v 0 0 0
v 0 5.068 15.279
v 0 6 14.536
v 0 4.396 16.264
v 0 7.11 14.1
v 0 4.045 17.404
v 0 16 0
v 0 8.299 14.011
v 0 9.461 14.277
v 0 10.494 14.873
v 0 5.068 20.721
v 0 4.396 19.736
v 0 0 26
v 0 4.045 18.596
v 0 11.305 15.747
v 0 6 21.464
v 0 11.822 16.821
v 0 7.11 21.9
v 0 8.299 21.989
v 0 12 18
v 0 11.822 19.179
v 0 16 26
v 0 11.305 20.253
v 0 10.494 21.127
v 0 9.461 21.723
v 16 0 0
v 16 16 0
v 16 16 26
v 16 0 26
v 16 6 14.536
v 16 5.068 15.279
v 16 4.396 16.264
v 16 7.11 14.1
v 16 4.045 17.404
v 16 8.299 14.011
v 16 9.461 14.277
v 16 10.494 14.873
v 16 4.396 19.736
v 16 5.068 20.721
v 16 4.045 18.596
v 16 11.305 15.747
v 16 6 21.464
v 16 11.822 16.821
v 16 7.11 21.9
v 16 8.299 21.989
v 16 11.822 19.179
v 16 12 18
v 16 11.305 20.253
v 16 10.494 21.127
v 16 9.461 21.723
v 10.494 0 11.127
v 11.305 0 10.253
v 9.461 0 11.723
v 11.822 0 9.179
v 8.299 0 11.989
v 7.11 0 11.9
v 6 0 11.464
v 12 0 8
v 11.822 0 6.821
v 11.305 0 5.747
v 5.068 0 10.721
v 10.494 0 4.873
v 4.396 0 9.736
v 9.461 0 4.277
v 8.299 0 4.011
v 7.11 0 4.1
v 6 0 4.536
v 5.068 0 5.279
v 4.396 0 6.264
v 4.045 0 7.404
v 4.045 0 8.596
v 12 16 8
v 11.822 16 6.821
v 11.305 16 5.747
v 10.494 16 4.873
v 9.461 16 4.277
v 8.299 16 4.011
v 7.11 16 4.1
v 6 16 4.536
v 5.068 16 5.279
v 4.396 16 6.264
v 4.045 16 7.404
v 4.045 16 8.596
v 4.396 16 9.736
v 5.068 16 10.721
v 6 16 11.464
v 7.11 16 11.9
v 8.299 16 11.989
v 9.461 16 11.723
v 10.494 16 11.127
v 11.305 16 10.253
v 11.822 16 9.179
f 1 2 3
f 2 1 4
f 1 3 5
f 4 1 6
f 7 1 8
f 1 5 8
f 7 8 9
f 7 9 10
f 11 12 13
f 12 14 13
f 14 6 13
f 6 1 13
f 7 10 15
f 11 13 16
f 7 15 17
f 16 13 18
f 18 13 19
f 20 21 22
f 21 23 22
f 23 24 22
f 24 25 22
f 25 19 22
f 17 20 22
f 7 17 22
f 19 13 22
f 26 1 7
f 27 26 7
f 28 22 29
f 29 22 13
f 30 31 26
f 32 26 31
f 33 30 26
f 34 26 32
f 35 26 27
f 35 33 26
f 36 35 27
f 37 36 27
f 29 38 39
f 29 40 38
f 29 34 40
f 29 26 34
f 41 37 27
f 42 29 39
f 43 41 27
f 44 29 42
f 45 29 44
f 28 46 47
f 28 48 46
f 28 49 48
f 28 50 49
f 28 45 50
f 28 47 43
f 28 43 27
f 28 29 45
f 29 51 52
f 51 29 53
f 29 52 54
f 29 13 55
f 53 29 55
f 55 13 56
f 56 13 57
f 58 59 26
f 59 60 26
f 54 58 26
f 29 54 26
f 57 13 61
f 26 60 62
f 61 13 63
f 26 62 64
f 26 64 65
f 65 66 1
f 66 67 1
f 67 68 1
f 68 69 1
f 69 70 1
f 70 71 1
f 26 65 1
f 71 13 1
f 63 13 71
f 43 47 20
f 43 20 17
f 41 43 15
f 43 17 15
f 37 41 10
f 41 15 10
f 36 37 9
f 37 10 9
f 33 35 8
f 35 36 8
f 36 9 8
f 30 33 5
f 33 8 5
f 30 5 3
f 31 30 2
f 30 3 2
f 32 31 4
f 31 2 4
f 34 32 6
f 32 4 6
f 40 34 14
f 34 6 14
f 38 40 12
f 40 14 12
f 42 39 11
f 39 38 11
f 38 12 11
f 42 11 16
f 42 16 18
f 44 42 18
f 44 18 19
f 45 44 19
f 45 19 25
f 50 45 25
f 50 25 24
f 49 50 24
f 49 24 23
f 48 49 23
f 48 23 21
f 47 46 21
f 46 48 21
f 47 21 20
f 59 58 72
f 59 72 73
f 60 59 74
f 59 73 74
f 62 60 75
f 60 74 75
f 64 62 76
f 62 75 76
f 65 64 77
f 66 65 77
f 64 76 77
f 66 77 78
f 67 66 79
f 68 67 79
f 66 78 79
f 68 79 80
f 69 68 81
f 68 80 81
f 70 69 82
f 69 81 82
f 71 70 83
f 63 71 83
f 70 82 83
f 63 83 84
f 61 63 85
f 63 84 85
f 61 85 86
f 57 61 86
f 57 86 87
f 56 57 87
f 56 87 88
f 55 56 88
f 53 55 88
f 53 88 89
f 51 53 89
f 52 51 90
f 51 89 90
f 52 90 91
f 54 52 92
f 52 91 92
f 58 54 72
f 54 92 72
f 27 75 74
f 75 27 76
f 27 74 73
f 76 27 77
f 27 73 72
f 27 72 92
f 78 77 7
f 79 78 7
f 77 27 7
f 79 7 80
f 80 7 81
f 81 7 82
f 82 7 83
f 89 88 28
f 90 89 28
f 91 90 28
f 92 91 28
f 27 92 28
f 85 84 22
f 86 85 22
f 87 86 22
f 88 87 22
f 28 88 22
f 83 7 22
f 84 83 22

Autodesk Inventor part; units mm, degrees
ref_plane "YZ Plane" through (0, 0, 0) normal (1, 0, 0) x (0, 1, 0)
ref_plane "XZ Plane" through (0, 0, 0) normal (0, 1, 0) x (-1, 0, 0)
ref_plane "XY Plane" through (0, 0, 0) normal (0, 0, 1) x (1, 0, 0)
sketch "Sketch1" plane through (0, 0, 0) normal (1, 0, 0) x (0, 1, 0)
  line L0 (0, 0) -> (16, 0)
  line L1 (16, 0) -> (16, 26)
  line L2 (16, 26) -> (0, 26)
  line L3 (0, 26) -> (0, 0)
  circle A0 centre (8, 18) radius 4
  dimension "d0" = 16
  dimension "d1" = 26
  dimension "d4" = 8
extrude "Extrusion1" add sketch "Sketch1" along normal blind 16
sketch "Sketch2" plane through (0, 16, 26) normal (0, 1, 0) x (1, 0, 0)
  circle A0 centre (8, 18) radius 4
  dimension "d8" = 8
extrude "Extrusion2" cut sketch "Sketch2" against normal blind 16
properties part number "BarClamp" material "Birch"
